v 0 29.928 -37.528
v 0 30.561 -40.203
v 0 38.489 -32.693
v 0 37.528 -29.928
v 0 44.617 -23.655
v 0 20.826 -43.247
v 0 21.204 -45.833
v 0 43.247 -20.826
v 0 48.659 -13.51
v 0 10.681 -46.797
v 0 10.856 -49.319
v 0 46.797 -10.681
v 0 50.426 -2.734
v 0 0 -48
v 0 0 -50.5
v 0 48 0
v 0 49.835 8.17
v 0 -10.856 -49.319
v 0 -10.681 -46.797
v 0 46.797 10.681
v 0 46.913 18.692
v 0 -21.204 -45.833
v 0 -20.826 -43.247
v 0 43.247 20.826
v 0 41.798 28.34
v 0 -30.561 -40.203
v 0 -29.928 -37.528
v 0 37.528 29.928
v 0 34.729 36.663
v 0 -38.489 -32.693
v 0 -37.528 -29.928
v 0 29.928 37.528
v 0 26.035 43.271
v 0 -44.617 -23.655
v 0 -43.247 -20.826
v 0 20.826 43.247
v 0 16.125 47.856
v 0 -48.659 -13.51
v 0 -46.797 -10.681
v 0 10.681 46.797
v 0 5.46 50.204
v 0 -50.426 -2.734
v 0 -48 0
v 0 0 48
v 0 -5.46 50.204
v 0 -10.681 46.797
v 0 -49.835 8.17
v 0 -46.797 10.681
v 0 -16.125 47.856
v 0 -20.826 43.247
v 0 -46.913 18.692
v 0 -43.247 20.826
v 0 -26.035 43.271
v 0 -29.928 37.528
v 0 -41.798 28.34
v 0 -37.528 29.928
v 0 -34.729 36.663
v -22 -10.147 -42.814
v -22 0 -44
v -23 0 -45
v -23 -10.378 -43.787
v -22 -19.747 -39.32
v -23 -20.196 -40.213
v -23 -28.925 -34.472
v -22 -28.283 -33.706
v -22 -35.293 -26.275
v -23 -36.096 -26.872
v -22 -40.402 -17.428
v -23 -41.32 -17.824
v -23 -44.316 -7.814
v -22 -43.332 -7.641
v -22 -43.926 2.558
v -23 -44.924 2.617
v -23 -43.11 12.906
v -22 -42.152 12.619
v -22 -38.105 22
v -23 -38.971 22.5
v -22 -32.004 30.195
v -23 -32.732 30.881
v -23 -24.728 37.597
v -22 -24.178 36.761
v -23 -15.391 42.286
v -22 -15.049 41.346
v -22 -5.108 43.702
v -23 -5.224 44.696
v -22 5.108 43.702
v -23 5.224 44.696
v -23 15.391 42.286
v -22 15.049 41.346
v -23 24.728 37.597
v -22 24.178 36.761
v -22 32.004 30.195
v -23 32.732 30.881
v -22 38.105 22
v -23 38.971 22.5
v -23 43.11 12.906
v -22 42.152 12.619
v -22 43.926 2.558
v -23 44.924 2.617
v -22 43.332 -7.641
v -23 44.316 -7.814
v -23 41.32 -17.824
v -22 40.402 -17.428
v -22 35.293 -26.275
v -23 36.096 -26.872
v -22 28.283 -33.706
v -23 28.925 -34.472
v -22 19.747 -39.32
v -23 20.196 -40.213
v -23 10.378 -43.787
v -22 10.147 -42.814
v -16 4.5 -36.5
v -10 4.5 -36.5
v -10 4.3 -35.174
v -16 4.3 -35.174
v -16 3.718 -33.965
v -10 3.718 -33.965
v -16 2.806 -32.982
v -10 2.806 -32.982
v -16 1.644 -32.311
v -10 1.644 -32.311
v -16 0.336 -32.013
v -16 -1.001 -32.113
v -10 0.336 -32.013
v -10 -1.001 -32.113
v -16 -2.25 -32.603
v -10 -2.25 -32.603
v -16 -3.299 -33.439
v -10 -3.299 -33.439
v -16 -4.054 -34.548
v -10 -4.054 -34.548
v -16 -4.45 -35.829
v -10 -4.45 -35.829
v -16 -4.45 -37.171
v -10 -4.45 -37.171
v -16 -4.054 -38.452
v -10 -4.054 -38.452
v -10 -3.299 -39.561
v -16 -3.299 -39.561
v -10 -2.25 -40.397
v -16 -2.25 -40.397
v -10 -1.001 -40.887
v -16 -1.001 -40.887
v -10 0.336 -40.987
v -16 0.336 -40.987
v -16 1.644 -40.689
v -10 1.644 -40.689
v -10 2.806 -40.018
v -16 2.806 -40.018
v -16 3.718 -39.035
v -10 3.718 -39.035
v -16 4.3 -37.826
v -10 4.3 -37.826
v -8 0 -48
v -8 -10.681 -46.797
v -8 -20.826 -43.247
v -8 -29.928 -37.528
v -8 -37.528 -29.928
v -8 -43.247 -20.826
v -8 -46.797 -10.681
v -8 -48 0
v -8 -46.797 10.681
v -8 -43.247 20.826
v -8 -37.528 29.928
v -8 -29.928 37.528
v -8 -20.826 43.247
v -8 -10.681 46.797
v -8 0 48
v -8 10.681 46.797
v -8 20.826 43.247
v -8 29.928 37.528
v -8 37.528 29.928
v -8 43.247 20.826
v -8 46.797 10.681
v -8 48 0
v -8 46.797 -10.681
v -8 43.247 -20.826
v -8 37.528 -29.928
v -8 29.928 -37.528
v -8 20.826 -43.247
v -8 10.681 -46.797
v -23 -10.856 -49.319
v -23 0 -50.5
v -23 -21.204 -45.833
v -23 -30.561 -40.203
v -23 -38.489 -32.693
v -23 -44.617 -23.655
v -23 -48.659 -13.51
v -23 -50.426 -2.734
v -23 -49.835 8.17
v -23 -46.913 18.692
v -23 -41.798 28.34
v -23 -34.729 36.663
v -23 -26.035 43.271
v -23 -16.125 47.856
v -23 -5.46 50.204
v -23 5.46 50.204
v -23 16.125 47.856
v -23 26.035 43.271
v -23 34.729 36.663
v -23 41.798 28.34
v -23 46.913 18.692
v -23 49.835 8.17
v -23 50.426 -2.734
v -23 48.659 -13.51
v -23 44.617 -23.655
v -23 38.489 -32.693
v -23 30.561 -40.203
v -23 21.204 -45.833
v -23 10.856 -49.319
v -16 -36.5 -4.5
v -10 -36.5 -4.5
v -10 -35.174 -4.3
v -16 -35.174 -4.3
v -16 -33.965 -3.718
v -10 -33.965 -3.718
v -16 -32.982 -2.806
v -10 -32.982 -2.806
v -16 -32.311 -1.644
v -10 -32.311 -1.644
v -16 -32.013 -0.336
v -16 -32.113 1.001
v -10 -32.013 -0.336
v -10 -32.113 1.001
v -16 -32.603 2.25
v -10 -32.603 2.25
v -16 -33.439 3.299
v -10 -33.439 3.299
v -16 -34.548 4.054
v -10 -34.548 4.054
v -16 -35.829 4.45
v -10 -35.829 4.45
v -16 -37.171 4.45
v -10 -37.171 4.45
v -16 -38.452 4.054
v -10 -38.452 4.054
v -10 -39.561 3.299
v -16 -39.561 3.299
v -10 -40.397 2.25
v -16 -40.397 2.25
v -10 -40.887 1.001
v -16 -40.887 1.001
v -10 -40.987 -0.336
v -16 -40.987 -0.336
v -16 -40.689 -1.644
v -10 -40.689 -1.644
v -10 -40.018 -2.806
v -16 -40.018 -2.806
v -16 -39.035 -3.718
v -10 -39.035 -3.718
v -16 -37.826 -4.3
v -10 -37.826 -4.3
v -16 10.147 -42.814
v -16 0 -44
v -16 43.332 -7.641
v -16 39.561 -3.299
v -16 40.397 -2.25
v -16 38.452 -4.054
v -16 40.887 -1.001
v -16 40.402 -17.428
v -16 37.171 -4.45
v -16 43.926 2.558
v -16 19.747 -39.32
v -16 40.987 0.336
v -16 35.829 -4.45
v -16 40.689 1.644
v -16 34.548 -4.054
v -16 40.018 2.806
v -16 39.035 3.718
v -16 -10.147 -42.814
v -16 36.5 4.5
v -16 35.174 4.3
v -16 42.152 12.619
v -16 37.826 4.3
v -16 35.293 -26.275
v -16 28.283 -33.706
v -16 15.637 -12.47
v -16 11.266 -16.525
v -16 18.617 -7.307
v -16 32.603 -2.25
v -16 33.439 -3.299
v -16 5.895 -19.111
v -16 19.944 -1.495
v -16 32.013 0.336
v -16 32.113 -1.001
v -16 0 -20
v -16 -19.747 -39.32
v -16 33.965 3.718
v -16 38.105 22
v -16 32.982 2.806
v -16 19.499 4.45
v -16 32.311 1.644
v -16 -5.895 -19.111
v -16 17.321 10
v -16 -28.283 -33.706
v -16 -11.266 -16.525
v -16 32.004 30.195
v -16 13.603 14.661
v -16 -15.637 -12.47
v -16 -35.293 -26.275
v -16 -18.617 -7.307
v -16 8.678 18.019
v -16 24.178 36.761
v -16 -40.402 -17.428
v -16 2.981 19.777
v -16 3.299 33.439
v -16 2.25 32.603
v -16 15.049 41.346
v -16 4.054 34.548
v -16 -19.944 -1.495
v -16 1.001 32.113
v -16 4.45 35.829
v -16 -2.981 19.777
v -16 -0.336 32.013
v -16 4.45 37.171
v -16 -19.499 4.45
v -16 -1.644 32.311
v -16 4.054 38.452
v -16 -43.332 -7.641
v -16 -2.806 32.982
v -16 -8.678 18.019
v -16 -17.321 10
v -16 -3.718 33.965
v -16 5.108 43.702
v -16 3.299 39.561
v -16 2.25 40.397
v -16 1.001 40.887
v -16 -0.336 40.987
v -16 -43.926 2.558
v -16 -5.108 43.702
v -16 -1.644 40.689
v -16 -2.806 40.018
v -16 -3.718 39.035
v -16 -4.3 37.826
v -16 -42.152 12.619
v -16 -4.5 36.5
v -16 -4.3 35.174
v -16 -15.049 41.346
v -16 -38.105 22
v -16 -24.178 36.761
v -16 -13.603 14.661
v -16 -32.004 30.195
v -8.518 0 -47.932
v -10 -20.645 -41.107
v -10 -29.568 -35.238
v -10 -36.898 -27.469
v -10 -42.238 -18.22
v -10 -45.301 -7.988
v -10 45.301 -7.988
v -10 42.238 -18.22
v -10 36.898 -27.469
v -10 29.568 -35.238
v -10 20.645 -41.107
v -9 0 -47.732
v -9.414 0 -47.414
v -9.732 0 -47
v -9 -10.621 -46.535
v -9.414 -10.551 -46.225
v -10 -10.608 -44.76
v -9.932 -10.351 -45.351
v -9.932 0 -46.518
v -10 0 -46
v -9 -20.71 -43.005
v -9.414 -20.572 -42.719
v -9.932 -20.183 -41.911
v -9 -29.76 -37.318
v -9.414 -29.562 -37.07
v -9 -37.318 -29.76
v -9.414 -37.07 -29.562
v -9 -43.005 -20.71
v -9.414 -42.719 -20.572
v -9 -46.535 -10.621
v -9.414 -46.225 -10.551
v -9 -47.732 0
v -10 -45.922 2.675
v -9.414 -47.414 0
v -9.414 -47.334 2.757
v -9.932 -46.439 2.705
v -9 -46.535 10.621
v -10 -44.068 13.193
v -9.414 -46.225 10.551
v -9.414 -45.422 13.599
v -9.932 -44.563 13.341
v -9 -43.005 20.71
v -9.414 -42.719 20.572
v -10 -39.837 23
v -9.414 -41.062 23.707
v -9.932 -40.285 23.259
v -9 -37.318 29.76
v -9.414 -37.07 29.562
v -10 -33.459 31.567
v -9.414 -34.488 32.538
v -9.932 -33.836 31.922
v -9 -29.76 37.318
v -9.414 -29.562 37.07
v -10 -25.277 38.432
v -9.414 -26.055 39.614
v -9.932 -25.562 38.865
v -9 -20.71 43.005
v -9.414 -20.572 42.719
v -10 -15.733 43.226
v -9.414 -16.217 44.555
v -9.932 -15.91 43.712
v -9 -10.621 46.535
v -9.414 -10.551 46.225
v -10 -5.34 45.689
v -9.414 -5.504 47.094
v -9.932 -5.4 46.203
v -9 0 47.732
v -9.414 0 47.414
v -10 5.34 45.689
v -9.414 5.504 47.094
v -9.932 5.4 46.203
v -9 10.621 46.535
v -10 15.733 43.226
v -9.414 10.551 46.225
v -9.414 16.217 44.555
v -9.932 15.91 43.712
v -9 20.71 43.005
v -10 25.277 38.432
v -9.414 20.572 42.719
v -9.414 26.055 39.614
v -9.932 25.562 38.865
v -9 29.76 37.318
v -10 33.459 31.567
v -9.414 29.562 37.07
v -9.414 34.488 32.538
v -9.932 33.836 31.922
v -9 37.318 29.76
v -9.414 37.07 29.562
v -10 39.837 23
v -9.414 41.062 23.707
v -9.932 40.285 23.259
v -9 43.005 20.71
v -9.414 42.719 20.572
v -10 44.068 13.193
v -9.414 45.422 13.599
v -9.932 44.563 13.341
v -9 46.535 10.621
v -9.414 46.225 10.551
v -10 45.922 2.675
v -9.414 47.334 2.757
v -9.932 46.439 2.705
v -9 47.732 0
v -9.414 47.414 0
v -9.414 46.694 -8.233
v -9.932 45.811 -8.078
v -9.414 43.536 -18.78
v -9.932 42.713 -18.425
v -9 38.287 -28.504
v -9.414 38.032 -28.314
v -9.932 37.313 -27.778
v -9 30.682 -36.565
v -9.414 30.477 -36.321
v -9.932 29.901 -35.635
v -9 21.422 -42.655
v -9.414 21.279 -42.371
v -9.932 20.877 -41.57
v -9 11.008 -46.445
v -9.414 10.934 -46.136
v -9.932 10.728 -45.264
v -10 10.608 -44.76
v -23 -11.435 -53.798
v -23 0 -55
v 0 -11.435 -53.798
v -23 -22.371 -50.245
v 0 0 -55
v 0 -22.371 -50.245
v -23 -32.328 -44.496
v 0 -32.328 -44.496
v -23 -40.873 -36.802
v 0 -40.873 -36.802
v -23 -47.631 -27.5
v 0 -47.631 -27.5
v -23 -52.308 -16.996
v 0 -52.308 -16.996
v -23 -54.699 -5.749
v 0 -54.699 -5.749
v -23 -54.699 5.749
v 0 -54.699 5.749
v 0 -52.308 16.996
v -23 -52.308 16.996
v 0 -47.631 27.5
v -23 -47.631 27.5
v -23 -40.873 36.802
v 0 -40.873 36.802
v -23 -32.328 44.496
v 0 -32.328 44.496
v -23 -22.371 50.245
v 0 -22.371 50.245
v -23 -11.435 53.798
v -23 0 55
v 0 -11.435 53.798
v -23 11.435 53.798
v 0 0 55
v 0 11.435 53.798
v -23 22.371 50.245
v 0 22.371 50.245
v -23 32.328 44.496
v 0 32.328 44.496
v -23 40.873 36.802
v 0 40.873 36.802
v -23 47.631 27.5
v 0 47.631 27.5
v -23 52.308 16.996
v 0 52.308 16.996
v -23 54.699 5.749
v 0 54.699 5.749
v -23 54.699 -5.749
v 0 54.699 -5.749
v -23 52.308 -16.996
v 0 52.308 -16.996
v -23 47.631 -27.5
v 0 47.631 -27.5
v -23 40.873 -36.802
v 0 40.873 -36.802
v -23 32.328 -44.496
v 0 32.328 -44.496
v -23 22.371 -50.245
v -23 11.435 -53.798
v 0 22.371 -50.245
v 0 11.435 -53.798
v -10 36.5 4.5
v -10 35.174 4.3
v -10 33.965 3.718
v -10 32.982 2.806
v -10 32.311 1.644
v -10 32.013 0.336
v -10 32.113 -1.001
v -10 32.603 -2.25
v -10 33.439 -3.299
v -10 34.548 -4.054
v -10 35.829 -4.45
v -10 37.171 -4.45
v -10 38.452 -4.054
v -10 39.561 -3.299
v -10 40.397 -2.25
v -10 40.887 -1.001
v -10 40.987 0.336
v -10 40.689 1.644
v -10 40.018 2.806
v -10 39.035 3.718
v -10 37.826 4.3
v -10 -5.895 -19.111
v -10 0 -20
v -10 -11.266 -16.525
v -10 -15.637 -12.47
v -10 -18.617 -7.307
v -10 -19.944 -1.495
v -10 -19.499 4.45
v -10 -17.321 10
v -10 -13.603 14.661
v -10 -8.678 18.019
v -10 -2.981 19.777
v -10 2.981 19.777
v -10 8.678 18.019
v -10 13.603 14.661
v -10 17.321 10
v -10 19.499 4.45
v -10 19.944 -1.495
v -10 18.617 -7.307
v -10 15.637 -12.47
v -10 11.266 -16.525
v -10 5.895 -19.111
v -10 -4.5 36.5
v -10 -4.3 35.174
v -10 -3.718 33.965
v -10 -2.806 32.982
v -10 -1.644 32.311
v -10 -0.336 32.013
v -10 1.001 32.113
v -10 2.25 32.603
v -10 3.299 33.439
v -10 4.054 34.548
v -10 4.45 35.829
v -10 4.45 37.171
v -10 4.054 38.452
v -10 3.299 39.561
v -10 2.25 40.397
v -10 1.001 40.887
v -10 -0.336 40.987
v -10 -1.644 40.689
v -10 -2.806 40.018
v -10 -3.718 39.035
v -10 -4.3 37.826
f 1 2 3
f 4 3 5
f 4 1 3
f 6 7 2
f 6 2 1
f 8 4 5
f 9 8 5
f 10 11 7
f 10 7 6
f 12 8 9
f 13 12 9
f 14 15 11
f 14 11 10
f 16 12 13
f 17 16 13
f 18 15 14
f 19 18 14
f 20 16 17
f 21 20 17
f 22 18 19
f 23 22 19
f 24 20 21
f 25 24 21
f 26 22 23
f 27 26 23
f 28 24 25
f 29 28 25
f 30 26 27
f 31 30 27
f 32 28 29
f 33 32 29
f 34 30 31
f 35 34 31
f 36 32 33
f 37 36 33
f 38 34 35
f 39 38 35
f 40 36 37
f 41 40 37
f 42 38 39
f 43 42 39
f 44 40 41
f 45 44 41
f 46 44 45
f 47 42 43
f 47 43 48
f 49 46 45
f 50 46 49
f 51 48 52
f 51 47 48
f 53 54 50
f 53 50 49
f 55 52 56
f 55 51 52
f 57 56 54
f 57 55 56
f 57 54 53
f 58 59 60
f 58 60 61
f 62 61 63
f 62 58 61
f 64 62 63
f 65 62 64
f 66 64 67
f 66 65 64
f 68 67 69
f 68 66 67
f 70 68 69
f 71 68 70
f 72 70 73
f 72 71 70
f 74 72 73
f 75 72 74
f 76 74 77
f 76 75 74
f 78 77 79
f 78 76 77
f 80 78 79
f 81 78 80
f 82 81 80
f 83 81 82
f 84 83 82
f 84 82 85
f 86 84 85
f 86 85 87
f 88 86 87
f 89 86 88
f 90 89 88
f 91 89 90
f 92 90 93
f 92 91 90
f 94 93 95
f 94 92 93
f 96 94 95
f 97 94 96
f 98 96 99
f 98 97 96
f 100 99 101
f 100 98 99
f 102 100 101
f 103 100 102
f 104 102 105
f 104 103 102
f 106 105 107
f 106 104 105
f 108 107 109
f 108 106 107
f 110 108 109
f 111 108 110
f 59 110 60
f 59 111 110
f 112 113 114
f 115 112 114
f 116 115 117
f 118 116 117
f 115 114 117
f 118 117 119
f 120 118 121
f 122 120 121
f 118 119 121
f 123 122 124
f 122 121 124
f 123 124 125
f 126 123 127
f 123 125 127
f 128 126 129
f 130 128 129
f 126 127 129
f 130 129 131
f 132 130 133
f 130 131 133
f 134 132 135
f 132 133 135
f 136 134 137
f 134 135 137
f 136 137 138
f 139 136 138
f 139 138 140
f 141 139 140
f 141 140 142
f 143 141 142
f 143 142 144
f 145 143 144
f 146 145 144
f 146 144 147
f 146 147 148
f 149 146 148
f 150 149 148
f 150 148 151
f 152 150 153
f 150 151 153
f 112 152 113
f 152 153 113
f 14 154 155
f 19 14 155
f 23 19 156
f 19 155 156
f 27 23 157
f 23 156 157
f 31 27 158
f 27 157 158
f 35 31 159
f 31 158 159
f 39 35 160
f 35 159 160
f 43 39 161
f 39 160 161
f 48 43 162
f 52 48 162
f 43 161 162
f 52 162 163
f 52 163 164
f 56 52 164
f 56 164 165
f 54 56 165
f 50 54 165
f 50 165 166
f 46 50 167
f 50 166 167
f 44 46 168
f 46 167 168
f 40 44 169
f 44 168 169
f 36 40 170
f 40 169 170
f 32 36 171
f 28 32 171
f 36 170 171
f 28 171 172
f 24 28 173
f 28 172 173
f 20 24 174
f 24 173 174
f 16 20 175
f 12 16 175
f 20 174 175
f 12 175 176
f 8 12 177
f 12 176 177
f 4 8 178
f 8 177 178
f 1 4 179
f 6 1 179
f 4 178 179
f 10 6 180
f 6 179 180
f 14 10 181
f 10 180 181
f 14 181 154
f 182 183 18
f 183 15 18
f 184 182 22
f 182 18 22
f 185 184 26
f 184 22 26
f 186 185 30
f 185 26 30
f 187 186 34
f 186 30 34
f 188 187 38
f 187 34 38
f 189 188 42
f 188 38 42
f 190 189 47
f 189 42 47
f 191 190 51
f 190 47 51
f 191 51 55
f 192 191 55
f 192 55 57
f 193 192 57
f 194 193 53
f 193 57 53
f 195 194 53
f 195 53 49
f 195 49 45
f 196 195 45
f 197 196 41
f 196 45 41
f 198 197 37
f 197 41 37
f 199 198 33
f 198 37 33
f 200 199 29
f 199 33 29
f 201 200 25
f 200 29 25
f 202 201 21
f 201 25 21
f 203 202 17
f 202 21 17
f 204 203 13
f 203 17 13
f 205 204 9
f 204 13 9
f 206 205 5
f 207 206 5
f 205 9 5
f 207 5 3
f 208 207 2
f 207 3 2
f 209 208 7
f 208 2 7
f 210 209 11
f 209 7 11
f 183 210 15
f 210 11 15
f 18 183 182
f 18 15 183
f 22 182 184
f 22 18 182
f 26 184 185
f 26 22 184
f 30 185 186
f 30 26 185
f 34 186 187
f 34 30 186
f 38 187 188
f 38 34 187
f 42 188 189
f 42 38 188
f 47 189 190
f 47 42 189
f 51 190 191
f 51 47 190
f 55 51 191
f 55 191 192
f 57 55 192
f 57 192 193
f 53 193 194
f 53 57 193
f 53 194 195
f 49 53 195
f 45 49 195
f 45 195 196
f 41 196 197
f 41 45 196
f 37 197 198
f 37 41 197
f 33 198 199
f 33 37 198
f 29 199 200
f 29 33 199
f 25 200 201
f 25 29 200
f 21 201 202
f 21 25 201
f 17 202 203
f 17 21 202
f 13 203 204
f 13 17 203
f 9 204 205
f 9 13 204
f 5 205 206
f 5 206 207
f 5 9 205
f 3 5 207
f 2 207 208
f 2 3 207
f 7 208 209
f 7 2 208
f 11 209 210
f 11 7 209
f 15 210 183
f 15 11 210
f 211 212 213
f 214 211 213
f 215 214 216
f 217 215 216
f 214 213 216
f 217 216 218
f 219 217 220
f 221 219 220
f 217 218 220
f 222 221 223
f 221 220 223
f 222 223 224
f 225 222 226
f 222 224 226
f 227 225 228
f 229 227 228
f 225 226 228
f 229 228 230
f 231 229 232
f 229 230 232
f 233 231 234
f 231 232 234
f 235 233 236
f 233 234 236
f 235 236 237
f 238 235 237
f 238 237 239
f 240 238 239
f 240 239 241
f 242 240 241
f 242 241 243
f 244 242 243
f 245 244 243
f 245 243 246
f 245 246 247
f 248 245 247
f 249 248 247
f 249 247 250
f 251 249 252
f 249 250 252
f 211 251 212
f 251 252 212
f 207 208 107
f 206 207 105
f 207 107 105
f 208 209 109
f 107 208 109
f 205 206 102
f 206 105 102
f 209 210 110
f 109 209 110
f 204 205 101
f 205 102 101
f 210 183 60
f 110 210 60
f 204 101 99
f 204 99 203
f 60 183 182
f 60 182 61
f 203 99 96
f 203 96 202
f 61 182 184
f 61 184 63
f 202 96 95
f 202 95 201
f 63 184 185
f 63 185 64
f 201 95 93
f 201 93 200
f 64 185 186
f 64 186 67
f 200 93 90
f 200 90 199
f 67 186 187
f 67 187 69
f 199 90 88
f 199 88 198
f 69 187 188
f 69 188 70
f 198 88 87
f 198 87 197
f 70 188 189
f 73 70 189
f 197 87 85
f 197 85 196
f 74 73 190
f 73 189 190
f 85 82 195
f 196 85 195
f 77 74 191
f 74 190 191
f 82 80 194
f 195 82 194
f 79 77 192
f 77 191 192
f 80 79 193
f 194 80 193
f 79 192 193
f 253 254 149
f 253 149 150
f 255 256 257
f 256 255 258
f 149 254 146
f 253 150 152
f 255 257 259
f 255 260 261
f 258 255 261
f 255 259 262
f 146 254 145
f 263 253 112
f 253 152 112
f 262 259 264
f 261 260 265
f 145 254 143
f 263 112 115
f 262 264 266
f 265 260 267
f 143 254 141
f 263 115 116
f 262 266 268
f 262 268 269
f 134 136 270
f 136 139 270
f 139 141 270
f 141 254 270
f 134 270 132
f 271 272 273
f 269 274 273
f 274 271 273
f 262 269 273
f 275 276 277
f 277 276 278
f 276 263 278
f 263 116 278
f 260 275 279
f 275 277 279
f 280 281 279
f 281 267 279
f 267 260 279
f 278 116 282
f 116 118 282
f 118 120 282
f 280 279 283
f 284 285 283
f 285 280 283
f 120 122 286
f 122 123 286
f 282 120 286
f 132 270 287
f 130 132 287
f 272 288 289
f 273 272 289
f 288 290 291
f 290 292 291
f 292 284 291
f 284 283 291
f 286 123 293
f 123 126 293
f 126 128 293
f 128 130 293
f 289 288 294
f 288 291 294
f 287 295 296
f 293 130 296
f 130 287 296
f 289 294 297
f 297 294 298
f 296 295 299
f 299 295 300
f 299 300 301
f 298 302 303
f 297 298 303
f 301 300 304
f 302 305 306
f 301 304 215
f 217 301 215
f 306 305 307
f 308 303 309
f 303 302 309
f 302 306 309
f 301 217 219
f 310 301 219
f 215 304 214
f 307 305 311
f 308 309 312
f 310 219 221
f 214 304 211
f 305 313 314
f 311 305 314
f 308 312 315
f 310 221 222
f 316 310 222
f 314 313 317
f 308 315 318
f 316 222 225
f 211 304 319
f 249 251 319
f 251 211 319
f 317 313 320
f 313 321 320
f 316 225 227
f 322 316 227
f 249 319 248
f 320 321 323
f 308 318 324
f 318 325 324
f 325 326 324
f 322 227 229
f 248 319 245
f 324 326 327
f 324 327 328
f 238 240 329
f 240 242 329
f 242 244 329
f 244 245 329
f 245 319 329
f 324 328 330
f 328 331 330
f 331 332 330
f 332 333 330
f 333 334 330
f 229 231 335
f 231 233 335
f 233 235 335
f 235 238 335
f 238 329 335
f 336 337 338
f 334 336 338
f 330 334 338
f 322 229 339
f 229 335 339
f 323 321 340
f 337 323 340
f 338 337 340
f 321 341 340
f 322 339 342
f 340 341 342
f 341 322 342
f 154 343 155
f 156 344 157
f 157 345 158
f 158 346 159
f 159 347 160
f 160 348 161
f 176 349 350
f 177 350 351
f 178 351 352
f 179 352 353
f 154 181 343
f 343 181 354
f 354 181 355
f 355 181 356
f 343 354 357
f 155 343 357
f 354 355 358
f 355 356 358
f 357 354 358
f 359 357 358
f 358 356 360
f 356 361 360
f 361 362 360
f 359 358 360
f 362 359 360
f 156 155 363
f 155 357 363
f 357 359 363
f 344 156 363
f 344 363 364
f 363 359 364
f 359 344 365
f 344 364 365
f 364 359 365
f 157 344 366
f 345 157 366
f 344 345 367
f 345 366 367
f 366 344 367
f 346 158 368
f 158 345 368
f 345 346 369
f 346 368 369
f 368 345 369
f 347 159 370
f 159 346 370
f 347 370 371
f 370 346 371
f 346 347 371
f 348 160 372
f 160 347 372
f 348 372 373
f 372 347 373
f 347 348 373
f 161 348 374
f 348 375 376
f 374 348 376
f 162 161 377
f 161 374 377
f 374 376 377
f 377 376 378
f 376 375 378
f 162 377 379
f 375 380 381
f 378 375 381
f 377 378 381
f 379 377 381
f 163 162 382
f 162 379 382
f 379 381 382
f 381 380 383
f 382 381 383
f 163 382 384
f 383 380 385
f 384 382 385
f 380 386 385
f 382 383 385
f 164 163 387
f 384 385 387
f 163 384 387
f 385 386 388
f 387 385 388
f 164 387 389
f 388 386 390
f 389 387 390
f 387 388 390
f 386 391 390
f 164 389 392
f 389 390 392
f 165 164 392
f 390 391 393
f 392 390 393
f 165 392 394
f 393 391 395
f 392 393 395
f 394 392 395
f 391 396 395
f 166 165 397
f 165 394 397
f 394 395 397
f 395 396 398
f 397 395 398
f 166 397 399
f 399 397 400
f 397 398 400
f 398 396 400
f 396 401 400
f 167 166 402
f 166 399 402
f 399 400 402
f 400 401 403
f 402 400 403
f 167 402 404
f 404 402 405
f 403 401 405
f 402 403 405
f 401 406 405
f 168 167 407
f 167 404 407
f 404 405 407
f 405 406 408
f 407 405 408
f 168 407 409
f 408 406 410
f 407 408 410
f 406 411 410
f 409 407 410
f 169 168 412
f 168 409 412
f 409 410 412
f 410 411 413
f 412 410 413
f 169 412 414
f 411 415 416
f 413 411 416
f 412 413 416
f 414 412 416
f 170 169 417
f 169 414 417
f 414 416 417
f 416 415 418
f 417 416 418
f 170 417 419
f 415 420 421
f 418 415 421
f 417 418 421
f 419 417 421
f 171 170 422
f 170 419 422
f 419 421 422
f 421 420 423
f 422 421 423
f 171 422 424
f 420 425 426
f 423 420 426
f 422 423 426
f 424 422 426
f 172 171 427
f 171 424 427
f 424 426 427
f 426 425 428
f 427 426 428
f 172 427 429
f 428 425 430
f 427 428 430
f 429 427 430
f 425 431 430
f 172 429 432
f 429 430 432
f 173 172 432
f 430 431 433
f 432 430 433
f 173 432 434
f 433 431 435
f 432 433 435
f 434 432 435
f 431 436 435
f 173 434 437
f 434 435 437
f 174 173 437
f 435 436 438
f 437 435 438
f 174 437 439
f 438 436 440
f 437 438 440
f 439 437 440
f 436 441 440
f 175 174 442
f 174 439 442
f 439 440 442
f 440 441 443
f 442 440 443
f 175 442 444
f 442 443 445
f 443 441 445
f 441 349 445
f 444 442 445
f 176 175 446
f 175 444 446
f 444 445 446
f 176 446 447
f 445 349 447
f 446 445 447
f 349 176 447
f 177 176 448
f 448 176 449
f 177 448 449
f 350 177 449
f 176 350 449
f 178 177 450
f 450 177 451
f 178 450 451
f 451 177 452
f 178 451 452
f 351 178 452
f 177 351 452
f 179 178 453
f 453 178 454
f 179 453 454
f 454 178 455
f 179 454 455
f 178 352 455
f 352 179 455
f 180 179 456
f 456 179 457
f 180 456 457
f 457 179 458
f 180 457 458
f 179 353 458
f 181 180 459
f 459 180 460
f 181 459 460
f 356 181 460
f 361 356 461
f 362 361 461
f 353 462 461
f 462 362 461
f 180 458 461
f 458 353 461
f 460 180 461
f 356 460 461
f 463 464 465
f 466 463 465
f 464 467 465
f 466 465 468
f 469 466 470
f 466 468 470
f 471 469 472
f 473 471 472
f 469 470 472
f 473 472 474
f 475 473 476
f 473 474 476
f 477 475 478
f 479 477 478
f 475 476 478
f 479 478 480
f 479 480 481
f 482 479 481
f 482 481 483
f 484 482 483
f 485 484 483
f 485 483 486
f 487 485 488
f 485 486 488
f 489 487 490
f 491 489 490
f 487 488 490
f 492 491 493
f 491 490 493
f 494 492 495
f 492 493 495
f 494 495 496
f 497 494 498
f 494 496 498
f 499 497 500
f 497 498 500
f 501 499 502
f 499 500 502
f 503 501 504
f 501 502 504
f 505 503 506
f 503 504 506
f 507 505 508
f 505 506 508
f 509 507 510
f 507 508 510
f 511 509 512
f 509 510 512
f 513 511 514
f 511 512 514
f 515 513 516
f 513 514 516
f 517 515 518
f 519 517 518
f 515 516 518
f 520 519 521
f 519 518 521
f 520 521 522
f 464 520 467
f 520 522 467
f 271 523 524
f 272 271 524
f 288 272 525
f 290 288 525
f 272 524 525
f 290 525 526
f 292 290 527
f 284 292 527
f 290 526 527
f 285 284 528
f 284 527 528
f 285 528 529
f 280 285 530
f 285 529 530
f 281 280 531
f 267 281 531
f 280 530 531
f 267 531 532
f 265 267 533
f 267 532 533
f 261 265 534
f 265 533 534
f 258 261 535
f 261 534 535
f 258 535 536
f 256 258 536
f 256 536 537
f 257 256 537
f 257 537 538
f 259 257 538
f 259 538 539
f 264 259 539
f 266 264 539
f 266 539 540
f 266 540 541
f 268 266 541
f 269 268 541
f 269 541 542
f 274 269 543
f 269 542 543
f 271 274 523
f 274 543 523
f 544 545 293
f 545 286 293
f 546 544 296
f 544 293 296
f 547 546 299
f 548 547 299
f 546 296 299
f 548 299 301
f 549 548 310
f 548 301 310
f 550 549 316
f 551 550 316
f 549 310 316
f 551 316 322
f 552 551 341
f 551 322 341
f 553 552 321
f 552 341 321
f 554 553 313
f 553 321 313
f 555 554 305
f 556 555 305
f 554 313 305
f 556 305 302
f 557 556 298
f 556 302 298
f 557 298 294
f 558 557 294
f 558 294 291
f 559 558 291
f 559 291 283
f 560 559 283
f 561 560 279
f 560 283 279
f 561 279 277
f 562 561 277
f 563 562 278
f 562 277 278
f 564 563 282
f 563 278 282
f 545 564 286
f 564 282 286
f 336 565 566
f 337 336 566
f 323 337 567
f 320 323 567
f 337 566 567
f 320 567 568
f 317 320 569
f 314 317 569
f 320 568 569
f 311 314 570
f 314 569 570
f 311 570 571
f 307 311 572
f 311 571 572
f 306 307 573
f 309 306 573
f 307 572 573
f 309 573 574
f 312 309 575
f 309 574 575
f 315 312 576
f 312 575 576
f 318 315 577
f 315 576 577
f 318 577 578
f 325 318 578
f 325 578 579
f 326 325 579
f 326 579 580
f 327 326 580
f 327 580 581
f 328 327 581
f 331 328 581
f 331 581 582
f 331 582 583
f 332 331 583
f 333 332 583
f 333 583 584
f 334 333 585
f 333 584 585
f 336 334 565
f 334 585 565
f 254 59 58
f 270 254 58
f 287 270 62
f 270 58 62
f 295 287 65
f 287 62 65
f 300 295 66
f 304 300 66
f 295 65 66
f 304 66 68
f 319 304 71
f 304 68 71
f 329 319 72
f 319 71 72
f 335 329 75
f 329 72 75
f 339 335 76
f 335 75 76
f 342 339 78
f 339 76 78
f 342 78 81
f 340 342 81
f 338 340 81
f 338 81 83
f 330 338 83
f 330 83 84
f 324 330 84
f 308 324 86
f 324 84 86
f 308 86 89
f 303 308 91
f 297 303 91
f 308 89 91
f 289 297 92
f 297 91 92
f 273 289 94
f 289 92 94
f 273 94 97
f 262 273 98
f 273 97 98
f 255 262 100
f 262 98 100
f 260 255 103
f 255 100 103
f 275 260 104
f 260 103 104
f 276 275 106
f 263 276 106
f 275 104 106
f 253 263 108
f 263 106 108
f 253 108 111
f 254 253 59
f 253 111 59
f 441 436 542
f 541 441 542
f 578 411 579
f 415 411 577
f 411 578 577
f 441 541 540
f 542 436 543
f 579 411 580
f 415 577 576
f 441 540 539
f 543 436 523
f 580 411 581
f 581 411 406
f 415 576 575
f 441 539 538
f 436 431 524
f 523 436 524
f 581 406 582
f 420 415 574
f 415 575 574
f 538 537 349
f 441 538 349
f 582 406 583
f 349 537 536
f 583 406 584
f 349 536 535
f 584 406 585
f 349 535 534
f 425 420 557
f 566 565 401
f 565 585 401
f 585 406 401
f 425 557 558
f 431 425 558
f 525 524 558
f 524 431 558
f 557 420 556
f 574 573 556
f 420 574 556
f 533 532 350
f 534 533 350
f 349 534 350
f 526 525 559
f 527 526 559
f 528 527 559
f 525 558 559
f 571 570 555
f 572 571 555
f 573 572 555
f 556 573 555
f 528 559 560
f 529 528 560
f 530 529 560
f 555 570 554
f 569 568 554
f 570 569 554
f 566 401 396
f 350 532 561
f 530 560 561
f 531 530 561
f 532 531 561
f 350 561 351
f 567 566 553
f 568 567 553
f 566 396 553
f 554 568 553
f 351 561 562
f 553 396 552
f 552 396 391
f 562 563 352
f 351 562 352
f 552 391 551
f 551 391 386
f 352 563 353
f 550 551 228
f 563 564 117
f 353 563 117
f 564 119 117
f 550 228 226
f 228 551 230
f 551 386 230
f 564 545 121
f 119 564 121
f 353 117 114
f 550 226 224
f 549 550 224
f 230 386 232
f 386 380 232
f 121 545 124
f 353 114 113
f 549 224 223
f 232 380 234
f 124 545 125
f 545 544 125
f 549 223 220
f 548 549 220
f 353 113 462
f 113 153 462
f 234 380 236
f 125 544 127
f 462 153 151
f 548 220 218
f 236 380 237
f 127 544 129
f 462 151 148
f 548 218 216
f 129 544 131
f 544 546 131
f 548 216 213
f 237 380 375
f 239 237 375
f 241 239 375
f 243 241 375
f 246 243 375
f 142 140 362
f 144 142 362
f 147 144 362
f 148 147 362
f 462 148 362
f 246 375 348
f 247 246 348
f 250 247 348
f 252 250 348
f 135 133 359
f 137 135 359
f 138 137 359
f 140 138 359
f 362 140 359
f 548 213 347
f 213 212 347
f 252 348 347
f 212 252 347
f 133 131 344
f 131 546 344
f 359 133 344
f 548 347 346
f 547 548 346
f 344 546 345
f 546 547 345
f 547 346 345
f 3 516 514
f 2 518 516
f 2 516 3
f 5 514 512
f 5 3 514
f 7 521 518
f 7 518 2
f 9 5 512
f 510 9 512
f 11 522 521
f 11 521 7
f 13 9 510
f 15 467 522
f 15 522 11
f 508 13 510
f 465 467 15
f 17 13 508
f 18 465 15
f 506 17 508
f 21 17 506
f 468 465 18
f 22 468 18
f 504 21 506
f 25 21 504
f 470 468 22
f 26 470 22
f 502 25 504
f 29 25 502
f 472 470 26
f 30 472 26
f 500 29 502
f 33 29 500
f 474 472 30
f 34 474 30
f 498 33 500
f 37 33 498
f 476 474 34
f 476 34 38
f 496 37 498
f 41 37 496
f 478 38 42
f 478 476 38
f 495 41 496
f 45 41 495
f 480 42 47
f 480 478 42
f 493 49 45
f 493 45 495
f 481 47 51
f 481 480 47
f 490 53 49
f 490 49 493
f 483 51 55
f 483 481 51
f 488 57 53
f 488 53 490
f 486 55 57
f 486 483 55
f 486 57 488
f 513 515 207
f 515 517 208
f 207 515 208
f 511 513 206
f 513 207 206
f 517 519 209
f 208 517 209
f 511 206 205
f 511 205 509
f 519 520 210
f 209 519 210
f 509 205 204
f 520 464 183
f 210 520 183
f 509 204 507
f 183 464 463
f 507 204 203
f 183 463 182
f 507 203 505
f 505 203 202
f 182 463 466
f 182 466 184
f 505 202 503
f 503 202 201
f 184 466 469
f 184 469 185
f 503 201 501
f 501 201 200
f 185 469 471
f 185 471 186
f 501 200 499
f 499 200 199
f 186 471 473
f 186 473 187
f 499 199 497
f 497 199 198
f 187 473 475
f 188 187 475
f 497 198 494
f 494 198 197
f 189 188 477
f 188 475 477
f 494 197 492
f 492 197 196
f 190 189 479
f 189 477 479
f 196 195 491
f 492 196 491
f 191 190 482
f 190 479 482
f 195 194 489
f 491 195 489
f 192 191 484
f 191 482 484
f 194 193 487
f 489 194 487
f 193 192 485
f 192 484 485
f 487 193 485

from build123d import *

# Parameters (mm, degrees)
SKETCH1_W         = 23
SKETCH1_H         = 50.5
SKETCH2_W         = 23
SKETCH2_H         = 4.5
SKETCH5_W         = 4.5
SKETCH5_H         = 16
CIRPATTERN1_COUNT = 4
FILLET1_R         = 2
CHAMFER2_SIZE     = 1


with BuildPart() as part:
    # Sketch1 → Revolve1 (revolve)
    with BuildSketch(Plane.XY, mode=Mode.PRIVATE) as revolve1_sk:
        with Locations((-11.5, 25.25)):
            Rectangle(SKETCH1_W, SKETCH1_H)
    revolve(revolve1_sk.sketch.rotate(Axis((0, 0, 0), (-1, 0, 0)), 90), axis=Axis((0, 0, 0), (-1, 0, 0)))

    # Sketch3 → Cut-Revolve1 (revolve, cut)
    with BuildSketch(Plane.XY, mode=Mode.PRIVATE) as cut_revolve1_sk:
        Polygon((0, 48), (-10, 48), (-10, 20), (-16, 20), (-16, 44), (-23, 44), (-23, 0), (0, 0), align=None)
    revolve(cut_revolve1_sk.sketch.rotate(Axis((0, 0, 0), (-1, 0, 0)), 90), axis=Axis((0, 0, 0), (-1, 0, 0)), mode=Mode.SUBTRACT)

    # Sketch5 → Ø9.0 (9) Diameter Hole1 (revolve, cut)
    with BuildSketch(Plane(origin=(-16, 36.5, 0), x_dir=(0, 0, 1), z_dir=(0, 1, 0))):
        with Locations((2.25, 8)):
            Rectangle(SKETCH5_W, SKETCH5_H)
    f_9_0_9_diameter_hole1 = revolve(axis=Axis((-22.35, 36.5, 0), (1, 0, 0)), mode=Mode.SUBTRACT)

    # CirPattern1: Ø9.0 (9) Diameter Hole1 ×4 about axis
    cirpattern1_axis = Axis((0, 0, 0), (1, 0, 0))
    for i in range(1, CIRPATTERN1_COUNT):
        add(f_9_0_9_diameter_hole1.rotate(cirpattern1_axis, i * 360 / CIRPATTERN1_COUNT), mode=Mode.SUBTRACT)

    # Fillet1
    fillet1_edges = [part.edges().sort_by_distance(p)[0] for p in [
        (-10, 0, 48),
    ]]
    fillet(fillet1_edges, radius=FILLET1_R)

    # Chamfer2
    chamfer2_edges = [part.edges().sort_by_distance(p)[0] for p in [
        (-23, 0, 44),
    ]]
    chamfer(chamfer2_edges, length=CHAMFER2_SIZE)


with BuildPart() as body_2:
    # Sketch2 → Revolve2 (revolve)
    with BuildSketch(Plane.XY, mode=Mode.PRIVATE) as revolve2_sk:
        with Locations((-11.5, 52.75)):
            Rectangle(SKETCH2_W, SKETCH2_H)
    revolve(revolve2_sk.sketch.rotate(Axis((0, 0, 0), (-1, 0, 0)), 90), axis=Axis((0, 0, 0), (-1, 0, 0)))


solid = Compound([part.part, body_2.part])
